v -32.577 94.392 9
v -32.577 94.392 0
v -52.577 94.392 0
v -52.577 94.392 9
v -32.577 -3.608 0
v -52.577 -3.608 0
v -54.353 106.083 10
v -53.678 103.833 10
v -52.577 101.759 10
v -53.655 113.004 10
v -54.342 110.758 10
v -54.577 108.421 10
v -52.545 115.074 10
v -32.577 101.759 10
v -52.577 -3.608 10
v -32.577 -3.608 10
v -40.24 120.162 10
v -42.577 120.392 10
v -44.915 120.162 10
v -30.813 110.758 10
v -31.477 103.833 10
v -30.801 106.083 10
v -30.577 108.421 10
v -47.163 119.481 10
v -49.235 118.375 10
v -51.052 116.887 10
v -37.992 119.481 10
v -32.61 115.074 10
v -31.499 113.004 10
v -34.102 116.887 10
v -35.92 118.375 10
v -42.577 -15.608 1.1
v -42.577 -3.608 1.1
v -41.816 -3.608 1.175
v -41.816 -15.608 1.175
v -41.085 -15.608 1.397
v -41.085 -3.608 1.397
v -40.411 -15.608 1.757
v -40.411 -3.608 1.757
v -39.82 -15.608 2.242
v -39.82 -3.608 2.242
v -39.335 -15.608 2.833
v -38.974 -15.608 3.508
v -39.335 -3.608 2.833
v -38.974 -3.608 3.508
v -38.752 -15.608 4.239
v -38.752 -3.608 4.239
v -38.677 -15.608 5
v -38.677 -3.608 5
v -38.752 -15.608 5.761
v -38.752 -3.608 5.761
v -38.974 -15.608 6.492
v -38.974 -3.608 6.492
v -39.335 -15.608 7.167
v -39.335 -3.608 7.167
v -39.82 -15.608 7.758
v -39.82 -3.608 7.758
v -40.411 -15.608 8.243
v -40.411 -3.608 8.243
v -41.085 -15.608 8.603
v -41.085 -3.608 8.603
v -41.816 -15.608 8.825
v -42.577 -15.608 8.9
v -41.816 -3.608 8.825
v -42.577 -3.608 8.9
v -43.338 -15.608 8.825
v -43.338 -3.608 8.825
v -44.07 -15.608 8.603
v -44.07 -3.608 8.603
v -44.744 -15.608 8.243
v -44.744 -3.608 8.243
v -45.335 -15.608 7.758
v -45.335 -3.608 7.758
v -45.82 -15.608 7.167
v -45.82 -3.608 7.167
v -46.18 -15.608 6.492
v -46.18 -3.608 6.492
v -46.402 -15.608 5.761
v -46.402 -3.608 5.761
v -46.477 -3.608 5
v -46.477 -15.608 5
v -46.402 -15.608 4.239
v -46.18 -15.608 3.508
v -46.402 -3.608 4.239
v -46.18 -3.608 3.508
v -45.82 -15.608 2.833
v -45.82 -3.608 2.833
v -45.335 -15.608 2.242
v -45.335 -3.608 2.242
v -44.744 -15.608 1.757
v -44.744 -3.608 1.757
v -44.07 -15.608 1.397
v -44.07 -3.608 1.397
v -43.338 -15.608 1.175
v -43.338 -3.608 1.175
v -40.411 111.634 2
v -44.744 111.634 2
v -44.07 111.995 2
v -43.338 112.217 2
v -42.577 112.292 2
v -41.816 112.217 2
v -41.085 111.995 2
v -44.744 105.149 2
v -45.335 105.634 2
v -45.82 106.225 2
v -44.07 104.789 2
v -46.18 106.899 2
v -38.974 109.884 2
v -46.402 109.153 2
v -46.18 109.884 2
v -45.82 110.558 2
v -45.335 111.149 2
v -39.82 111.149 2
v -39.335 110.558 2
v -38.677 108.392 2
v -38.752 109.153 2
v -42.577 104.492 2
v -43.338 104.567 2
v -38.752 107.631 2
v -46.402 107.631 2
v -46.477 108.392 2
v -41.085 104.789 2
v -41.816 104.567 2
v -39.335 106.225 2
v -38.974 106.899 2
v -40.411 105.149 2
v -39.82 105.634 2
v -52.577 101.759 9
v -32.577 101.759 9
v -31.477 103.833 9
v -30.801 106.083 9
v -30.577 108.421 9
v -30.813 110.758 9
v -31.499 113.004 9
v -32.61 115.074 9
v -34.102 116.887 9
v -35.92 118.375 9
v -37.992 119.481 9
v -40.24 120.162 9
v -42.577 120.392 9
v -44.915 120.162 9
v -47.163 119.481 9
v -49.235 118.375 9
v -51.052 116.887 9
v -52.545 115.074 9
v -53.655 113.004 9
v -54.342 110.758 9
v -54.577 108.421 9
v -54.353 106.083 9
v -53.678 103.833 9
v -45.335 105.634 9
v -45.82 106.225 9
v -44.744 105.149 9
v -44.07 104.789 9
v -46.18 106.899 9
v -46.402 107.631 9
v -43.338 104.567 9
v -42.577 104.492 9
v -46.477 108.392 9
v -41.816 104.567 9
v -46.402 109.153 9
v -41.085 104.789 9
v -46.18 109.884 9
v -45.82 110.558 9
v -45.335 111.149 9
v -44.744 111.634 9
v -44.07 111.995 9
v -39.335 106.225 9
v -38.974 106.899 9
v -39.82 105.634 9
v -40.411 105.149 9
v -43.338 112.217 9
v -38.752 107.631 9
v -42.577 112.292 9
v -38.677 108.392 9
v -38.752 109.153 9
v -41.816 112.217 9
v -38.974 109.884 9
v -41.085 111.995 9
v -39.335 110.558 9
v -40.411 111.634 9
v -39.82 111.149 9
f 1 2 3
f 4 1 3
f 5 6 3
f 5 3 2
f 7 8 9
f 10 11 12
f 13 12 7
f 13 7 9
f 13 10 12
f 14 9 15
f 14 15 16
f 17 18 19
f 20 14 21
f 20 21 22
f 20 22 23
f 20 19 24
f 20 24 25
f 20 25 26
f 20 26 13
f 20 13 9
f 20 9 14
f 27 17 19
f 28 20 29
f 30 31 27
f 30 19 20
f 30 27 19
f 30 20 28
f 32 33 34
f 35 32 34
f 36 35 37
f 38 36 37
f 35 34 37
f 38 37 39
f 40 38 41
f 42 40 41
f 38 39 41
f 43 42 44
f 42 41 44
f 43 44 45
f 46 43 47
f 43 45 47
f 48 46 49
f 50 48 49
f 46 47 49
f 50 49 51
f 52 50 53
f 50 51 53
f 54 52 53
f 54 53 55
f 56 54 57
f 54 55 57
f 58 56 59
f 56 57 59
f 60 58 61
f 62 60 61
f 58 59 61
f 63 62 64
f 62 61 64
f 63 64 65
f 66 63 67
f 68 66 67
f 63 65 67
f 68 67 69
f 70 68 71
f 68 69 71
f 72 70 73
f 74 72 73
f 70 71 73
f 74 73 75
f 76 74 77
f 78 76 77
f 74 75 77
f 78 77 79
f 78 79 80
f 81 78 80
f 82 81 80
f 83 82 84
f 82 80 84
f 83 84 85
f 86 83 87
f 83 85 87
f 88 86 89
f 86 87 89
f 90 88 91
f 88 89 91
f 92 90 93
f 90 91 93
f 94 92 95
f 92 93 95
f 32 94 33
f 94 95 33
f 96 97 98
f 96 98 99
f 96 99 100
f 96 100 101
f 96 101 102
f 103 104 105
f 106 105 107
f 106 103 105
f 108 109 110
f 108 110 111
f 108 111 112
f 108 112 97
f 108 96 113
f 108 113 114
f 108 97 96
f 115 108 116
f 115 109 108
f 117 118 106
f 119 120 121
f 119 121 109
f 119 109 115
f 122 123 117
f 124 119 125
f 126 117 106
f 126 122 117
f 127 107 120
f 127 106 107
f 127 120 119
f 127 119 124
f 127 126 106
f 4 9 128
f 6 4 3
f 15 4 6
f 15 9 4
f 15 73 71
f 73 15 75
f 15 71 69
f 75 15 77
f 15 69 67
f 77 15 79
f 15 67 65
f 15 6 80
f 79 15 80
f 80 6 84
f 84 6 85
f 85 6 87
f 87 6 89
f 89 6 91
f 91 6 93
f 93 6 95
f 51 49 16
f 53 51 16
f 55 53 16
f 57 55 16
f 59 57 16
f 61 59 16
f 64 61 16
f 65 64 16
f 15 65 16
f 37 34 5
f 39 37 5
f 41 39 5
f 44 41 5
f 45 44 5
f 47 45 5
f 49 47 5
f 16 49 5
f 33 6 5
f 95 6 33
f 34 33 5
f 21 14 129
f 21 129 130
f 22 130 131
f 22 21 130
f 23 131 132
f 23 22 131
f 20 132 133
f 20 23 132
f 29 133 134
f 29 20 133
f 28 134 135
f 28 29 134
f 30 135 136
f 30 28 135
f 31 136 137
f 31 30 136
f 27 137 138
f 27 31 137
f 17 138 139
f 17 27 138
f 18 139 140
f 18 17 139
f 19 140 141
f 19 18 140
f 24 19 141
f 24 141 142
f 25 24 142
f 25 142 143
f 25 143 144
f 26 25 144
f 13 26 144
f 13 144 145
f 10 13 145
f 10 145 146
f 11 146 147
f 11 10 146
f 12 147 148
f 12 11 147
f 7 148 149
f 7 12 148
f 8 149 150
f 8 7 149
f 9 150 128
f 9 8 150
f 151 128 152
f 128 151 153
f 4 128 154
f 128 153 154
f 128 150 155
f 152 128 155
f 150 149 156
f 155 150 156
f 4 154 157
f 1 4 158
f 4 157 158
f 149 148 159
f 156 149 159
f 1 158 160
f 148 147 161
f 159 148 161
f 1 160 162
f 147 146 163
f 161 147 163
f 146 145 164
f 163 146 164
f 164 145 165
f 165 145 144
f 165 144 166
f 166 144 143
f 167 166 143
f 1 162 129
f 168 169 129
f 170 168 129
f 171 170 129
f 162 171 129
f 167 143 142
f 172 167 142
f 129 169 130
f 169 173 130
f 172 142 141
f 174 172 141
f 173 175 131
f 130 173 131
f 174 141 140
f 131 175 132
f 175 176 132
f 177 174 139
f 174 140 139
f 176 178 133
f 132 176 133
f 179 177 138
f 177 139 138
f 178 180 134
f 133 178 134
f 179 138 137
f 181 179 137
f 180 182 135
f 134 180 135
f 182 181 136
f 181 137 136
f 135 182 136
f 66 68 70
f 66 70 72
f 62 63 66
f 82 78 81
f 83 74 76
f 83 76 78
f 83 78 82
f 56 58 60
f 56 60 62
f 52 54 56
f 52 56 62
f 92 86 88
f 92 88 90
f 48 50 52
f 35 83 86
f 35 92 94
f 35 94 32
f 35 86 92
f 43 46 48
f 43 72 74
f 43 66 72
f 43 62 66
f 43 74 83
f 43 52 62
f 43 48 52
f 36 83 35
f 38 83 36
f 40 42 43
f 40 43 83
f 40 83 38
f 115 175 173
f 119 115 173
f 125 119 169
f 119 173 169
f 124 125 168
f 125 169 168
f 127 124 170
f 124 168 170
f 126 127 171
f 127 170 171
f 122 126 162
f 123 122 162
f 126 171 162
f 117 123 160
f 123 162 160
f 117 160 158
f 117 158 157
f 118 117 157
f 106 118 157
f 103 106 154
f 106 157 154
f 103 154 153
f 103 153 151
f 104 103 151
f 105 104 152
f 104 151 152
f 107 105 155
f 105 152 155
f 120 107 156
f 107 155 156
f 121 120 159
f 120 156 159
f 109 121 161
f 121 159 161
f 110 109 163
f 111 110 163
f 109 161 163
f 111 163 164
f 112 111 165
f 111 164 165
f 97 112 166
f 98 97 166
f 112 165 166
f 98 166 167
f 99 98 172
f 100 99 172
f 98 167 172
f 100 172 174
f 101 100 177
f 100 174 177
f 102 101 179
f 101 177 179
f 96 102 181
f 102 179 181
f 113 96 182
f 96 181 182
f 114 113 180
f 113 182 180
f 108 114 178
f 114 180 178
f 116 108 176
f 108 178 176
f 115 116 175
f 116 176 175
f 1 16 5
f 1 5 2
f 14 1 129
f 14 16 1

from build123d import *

# Parameters (mm, degrees)
SKETCH2_W           = 20
SKETCH2_H           = 100
BOSS_EXTRUDE1_DEPTH = 10
SKETCH3_R           = 3.9
BOSS_EXTRUDE2_DEPTH = 12
BOSS_EXTRUDE3_DEPTH = 1
SKETCH5_R           = 3.9
BOSS_EXTRUDE4_DEPTH = 7
SKETCH6_W           = 20
SKETCH6_H           = 2
CUT_EXTRUDE1_DEPTH  = 9


with BuildPart() as part:
    # Sketch2 → Boss-Extrude1 (new body)
    with BuildSketch(Plane.XY):
        with Locations((-42.577319588, 46.391752577)):
            Rectangle(SKETCH2_W, SKETCH2_H)
    extrude(amount=BOSS_EXTRUDE1_DEPTH)

    # Sketch3 → Boss-Extrude2 (add)
    with BuildSketch(Plane.XZ.offset(3.608247423)):
        with Locations(Location((-42.577319588, 5, 0), (0, 0, 270))):
            Circle(SKETCH3_R)
    extrude(amount=BOSS_EXTRUDE2_DEPTH)

    # Sketch4 → Boss-Extrude3 (add)
    with BuildSketch(Plane.XY.offset(10)):
        with BuildLine():
            Line((-32.577319588, 96.391752577), (-32.577319588, 101.758502997))
            ThreePointArc((-32.577319588, 101.758502997), (-42.577319588, 120.391752577), (-52.577319588, 101.758502997))
            Line((-52.577319588, 101.758502997), (-52.577319588, 96.391752577))
            Line((-52.577319588, 96.391752577), (-32.577319588, 96.391752577))
        make_face()
    extrude(amount=-BOSS_EXTRUDE3_DEPTH)

    # Sketch5 → Boss-Extrude4 (add)
    with BuildSketch(Plane(origin=(0, 0, 9), x_dir=(-1, 0, 0), z_dir=(0, 0, -1))):
        with Locations(Location((42.577319588, 108.391752577, 0), (0, 0, 180))):
            Circle(SKETCH5_R)
    extrude(amount=BOSS_EXTRUDE4_DEPTH)

    # Sketch6 → Cut-Extrude1 (cut)
    with BuildSketch(Plane(origin=(0, 0, 0), x_dir=(-1, 0, 0), z_dir=(0, 0, -1))):
        with Locations((42.577319588, 95.391752577)):
            Rectangle(SKETCH6_W, SKETCH6_H)
    extrude(amount=-CUT_EXTRUDE1_DEPTH, mode=Mode.SUBTRACT)


solid = part.part
